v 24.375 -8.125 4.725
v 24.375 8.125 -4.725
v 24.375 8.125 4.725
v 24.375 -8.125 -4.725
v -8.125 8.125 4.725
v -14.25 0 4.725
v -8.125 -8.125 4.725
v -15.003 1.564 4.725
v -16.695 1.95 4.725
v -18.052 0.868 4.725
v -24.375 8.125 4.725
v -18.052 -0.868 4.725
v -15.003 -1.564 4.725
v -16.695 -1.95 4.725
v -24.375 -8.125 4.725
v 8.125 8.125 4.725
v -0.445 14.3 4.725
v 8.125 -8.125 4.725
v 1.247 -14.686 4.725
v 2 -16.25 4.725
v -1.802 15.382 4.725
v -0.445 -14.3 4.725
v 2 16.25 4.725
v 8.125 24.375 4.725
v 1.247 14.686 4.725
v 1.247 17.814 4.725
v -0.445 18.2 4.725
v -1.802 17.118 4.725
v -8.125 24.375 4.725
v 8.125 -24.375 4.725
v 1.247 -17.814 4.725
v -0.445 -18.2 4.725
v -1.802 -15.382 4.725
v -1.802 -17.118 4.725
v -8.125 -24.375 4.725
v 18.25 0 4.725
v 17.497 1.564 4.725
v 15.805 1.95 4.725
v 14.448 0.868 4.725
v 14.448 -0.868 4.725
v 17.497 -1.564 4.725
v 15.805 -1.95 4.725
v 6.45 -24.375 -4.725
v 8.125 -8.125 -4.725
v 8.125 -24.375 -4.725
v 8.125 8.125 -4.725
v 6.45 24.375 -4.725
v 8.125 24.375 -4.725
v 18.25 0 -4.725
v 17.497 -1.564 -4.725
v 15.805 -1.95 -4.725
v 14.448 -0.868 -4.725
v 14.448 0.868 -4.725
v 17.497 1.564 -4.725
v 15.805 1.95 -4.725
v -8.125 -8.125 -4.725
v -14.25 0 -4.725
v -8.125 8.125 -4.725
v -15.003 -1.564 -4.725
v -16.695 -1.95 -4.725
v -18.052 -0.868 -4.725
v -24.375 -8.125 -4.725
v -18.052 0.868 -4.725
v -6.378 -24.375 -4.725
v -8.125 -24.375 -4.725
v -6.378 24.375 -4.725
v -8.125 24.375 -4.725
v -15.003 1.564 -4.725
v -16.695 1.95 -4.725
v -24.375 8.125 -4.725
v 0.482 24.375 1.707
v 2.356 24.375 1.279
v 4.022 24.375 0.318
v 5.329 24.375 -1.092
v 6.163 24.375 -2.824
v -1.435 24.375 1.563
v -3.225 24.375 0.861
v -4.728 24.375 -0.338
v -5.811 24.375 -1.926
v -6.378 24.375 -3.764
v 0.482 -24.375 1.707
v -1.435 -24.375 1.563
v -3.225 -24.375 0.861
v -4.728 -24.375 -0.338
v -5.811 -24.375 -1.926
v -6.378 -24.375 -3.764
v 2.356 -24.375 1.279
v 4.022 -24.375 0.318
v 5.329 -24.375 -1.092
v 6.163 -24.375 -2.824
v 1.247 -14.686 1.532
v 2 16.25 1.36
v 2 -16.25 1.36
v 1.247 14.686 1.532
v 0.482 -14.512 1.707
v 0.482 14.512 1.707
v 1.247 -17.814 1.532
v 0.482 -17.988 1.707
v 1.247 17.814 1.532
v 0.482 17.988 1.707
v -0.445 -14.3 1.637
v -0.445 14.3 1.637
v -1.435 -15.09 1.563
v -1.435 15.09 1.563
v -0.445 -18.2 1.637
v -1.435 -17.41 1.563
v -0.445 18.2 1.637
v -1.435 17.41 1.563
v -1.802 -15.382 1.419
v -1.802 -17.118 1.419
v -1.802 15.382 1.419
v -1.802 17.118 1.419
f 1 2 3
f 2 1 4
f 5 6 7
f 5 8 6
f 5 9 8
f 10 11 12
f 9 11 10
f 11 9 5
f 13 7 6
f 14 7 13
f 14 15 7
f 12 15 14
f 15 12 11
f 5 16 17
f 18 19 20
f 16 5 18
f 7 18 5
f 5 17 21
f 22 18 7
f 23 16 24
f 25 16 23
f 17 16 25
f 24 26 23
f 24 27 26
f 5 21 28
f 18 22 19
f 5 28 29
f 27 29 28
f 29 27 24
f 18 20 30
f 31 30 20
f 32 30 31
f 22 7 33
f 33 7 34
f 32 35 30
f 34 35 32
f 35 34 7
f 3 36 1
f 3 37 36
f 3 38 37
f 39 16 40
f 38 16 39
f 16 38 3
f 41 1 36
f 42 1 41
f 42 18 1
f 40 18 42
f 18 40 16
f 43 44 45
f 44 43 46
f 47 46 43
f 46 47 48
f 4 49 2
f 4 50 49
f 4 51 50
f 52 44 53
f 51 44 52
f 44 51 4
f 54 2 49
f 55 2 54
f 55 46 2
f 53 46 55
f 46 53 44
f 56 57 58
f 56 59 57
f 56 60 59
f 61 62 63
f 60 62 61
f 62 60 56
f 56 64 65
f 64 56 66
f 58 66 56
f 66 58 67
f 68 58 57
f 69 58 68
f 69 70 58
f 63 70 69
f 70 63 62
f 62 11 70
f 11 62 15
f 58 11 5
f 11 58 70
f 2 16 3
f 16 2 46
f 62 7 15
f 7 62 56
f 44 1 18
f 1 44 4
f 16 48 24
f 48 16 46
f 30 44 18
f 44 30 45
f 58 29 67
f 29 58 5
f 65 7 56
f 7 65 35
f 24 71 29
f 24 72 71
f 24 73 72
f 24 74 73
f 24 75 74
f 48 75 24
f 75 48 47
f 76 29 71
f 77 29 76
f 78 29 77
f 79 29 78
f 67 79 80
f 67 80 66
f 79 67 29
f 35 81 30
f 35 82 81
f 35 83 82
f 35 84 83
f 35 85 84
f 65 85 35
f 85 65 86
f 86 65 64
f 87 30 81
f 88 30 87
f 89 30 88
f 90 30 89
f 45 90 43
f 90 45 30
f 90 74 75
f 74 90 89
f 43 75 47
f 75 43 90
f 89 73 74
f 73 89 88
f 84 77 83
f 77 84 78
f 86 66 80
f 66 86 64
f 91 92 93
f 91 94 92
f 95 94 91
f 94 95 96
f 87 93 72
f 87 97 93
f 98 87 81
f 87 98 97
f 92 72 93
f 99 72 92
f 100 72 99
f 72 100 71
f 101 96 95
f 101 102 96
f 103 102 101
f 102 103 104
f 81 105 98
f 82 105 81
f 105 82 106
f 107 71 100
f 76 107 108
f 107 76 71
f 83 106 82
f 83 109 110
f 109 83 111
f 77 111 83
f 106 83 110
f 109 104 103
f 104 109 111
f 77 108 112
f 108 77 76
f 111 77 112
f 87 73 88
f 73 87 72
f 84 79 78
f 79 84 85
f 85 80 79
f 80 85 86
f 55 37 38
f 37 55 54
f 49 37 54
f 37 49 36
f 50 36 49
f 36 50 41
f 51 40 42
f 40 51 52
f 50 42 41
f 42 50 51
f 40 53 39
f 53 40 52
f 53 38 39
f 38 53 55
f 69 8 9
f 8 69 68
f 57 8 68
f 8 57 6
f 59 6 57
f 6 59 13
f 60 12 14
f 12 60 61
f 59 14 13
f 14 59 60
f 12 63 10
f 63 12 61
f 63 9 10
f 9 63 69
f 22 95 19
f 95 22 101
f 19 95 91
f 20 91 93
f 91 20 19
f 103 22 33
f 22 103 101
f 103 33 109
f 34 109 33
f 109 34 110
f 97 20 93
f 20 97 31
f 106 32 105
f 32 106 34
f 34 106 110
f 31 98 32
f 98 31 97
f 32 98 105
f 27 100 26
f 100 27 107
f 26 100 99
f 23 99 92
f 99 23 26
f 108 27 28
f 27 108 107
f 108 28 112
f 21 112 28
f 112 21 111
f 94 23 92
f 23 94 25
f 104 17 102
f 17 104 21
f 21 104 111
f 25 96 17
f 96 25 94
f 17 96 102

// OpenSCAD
// file: model_dims.scad
// motormounts
m_h = c_d/2 + 3; 	// height of motor mount
x_1 = 16.25;		// distance from centre of motor mount to centre of screwholes
m_w = x_1; 			// width of motor mount

// body
ah_l = 55 ;//arm_holder_length
ch_full_l = 90; // full width of chassis
ch_full_h = 4.05; // height of chassis layer
// file: hardware_dims.scad
c_d = 12.9; 		// diameter of carbon fiber
s_d = 4; 			// diameter of silver screw holes

// units of PDB
pdb_bw = 50; // board_width
pdb_ch_d = 12.7; //centre_hole_dia = 12.8
sh_d = 3.2; //small_hole_dia = 3
dh_sd = 7.9; //small_hole_dist_from_side = 7.9
lh_sd = 19; //large_hole_dist_from_side = 19
p_w = 7.7; //pin_width = 7.7
d_diag = 13.9; //deans_diag = 13.9
p_sd = 8.4; //pin_dist_from_side = 8.4
d_sd = 20.8; //deans_dist_from_side = 20.8
sh_dc = 16.2; // small hole (orthogonal) distance from center
// main file
// tiny motormounts

include <hardware_dims.scad>
include <model_dims.scad>

difference() {
	union() {
			cube(size=[3*m_w,1*m_w,m_h], center=true);
			cube(size=[1*m_w,3*m_w,m_h], center=true);
	}
	union() {
		translate([0,0,-m_h/2]) rotate([90,0,0]) cylinder(h=4*m_w, r=c_d/2, center=true);
		translate([x_1,0,0]) cylinder(h=2*m_h, r=s_d/2,center=true);
		translate([-x_1,0,0]) cylinder(h=2*m_h, r=s_d/2,center=true);
		translate([0,-x_1,0]) cylinder(h=2*m_h, r=s_d/2,center=true);
		translate([0,x_1,0]) cylinder(h=2*m_h, r=s_d/2,center=true);
	}
}
